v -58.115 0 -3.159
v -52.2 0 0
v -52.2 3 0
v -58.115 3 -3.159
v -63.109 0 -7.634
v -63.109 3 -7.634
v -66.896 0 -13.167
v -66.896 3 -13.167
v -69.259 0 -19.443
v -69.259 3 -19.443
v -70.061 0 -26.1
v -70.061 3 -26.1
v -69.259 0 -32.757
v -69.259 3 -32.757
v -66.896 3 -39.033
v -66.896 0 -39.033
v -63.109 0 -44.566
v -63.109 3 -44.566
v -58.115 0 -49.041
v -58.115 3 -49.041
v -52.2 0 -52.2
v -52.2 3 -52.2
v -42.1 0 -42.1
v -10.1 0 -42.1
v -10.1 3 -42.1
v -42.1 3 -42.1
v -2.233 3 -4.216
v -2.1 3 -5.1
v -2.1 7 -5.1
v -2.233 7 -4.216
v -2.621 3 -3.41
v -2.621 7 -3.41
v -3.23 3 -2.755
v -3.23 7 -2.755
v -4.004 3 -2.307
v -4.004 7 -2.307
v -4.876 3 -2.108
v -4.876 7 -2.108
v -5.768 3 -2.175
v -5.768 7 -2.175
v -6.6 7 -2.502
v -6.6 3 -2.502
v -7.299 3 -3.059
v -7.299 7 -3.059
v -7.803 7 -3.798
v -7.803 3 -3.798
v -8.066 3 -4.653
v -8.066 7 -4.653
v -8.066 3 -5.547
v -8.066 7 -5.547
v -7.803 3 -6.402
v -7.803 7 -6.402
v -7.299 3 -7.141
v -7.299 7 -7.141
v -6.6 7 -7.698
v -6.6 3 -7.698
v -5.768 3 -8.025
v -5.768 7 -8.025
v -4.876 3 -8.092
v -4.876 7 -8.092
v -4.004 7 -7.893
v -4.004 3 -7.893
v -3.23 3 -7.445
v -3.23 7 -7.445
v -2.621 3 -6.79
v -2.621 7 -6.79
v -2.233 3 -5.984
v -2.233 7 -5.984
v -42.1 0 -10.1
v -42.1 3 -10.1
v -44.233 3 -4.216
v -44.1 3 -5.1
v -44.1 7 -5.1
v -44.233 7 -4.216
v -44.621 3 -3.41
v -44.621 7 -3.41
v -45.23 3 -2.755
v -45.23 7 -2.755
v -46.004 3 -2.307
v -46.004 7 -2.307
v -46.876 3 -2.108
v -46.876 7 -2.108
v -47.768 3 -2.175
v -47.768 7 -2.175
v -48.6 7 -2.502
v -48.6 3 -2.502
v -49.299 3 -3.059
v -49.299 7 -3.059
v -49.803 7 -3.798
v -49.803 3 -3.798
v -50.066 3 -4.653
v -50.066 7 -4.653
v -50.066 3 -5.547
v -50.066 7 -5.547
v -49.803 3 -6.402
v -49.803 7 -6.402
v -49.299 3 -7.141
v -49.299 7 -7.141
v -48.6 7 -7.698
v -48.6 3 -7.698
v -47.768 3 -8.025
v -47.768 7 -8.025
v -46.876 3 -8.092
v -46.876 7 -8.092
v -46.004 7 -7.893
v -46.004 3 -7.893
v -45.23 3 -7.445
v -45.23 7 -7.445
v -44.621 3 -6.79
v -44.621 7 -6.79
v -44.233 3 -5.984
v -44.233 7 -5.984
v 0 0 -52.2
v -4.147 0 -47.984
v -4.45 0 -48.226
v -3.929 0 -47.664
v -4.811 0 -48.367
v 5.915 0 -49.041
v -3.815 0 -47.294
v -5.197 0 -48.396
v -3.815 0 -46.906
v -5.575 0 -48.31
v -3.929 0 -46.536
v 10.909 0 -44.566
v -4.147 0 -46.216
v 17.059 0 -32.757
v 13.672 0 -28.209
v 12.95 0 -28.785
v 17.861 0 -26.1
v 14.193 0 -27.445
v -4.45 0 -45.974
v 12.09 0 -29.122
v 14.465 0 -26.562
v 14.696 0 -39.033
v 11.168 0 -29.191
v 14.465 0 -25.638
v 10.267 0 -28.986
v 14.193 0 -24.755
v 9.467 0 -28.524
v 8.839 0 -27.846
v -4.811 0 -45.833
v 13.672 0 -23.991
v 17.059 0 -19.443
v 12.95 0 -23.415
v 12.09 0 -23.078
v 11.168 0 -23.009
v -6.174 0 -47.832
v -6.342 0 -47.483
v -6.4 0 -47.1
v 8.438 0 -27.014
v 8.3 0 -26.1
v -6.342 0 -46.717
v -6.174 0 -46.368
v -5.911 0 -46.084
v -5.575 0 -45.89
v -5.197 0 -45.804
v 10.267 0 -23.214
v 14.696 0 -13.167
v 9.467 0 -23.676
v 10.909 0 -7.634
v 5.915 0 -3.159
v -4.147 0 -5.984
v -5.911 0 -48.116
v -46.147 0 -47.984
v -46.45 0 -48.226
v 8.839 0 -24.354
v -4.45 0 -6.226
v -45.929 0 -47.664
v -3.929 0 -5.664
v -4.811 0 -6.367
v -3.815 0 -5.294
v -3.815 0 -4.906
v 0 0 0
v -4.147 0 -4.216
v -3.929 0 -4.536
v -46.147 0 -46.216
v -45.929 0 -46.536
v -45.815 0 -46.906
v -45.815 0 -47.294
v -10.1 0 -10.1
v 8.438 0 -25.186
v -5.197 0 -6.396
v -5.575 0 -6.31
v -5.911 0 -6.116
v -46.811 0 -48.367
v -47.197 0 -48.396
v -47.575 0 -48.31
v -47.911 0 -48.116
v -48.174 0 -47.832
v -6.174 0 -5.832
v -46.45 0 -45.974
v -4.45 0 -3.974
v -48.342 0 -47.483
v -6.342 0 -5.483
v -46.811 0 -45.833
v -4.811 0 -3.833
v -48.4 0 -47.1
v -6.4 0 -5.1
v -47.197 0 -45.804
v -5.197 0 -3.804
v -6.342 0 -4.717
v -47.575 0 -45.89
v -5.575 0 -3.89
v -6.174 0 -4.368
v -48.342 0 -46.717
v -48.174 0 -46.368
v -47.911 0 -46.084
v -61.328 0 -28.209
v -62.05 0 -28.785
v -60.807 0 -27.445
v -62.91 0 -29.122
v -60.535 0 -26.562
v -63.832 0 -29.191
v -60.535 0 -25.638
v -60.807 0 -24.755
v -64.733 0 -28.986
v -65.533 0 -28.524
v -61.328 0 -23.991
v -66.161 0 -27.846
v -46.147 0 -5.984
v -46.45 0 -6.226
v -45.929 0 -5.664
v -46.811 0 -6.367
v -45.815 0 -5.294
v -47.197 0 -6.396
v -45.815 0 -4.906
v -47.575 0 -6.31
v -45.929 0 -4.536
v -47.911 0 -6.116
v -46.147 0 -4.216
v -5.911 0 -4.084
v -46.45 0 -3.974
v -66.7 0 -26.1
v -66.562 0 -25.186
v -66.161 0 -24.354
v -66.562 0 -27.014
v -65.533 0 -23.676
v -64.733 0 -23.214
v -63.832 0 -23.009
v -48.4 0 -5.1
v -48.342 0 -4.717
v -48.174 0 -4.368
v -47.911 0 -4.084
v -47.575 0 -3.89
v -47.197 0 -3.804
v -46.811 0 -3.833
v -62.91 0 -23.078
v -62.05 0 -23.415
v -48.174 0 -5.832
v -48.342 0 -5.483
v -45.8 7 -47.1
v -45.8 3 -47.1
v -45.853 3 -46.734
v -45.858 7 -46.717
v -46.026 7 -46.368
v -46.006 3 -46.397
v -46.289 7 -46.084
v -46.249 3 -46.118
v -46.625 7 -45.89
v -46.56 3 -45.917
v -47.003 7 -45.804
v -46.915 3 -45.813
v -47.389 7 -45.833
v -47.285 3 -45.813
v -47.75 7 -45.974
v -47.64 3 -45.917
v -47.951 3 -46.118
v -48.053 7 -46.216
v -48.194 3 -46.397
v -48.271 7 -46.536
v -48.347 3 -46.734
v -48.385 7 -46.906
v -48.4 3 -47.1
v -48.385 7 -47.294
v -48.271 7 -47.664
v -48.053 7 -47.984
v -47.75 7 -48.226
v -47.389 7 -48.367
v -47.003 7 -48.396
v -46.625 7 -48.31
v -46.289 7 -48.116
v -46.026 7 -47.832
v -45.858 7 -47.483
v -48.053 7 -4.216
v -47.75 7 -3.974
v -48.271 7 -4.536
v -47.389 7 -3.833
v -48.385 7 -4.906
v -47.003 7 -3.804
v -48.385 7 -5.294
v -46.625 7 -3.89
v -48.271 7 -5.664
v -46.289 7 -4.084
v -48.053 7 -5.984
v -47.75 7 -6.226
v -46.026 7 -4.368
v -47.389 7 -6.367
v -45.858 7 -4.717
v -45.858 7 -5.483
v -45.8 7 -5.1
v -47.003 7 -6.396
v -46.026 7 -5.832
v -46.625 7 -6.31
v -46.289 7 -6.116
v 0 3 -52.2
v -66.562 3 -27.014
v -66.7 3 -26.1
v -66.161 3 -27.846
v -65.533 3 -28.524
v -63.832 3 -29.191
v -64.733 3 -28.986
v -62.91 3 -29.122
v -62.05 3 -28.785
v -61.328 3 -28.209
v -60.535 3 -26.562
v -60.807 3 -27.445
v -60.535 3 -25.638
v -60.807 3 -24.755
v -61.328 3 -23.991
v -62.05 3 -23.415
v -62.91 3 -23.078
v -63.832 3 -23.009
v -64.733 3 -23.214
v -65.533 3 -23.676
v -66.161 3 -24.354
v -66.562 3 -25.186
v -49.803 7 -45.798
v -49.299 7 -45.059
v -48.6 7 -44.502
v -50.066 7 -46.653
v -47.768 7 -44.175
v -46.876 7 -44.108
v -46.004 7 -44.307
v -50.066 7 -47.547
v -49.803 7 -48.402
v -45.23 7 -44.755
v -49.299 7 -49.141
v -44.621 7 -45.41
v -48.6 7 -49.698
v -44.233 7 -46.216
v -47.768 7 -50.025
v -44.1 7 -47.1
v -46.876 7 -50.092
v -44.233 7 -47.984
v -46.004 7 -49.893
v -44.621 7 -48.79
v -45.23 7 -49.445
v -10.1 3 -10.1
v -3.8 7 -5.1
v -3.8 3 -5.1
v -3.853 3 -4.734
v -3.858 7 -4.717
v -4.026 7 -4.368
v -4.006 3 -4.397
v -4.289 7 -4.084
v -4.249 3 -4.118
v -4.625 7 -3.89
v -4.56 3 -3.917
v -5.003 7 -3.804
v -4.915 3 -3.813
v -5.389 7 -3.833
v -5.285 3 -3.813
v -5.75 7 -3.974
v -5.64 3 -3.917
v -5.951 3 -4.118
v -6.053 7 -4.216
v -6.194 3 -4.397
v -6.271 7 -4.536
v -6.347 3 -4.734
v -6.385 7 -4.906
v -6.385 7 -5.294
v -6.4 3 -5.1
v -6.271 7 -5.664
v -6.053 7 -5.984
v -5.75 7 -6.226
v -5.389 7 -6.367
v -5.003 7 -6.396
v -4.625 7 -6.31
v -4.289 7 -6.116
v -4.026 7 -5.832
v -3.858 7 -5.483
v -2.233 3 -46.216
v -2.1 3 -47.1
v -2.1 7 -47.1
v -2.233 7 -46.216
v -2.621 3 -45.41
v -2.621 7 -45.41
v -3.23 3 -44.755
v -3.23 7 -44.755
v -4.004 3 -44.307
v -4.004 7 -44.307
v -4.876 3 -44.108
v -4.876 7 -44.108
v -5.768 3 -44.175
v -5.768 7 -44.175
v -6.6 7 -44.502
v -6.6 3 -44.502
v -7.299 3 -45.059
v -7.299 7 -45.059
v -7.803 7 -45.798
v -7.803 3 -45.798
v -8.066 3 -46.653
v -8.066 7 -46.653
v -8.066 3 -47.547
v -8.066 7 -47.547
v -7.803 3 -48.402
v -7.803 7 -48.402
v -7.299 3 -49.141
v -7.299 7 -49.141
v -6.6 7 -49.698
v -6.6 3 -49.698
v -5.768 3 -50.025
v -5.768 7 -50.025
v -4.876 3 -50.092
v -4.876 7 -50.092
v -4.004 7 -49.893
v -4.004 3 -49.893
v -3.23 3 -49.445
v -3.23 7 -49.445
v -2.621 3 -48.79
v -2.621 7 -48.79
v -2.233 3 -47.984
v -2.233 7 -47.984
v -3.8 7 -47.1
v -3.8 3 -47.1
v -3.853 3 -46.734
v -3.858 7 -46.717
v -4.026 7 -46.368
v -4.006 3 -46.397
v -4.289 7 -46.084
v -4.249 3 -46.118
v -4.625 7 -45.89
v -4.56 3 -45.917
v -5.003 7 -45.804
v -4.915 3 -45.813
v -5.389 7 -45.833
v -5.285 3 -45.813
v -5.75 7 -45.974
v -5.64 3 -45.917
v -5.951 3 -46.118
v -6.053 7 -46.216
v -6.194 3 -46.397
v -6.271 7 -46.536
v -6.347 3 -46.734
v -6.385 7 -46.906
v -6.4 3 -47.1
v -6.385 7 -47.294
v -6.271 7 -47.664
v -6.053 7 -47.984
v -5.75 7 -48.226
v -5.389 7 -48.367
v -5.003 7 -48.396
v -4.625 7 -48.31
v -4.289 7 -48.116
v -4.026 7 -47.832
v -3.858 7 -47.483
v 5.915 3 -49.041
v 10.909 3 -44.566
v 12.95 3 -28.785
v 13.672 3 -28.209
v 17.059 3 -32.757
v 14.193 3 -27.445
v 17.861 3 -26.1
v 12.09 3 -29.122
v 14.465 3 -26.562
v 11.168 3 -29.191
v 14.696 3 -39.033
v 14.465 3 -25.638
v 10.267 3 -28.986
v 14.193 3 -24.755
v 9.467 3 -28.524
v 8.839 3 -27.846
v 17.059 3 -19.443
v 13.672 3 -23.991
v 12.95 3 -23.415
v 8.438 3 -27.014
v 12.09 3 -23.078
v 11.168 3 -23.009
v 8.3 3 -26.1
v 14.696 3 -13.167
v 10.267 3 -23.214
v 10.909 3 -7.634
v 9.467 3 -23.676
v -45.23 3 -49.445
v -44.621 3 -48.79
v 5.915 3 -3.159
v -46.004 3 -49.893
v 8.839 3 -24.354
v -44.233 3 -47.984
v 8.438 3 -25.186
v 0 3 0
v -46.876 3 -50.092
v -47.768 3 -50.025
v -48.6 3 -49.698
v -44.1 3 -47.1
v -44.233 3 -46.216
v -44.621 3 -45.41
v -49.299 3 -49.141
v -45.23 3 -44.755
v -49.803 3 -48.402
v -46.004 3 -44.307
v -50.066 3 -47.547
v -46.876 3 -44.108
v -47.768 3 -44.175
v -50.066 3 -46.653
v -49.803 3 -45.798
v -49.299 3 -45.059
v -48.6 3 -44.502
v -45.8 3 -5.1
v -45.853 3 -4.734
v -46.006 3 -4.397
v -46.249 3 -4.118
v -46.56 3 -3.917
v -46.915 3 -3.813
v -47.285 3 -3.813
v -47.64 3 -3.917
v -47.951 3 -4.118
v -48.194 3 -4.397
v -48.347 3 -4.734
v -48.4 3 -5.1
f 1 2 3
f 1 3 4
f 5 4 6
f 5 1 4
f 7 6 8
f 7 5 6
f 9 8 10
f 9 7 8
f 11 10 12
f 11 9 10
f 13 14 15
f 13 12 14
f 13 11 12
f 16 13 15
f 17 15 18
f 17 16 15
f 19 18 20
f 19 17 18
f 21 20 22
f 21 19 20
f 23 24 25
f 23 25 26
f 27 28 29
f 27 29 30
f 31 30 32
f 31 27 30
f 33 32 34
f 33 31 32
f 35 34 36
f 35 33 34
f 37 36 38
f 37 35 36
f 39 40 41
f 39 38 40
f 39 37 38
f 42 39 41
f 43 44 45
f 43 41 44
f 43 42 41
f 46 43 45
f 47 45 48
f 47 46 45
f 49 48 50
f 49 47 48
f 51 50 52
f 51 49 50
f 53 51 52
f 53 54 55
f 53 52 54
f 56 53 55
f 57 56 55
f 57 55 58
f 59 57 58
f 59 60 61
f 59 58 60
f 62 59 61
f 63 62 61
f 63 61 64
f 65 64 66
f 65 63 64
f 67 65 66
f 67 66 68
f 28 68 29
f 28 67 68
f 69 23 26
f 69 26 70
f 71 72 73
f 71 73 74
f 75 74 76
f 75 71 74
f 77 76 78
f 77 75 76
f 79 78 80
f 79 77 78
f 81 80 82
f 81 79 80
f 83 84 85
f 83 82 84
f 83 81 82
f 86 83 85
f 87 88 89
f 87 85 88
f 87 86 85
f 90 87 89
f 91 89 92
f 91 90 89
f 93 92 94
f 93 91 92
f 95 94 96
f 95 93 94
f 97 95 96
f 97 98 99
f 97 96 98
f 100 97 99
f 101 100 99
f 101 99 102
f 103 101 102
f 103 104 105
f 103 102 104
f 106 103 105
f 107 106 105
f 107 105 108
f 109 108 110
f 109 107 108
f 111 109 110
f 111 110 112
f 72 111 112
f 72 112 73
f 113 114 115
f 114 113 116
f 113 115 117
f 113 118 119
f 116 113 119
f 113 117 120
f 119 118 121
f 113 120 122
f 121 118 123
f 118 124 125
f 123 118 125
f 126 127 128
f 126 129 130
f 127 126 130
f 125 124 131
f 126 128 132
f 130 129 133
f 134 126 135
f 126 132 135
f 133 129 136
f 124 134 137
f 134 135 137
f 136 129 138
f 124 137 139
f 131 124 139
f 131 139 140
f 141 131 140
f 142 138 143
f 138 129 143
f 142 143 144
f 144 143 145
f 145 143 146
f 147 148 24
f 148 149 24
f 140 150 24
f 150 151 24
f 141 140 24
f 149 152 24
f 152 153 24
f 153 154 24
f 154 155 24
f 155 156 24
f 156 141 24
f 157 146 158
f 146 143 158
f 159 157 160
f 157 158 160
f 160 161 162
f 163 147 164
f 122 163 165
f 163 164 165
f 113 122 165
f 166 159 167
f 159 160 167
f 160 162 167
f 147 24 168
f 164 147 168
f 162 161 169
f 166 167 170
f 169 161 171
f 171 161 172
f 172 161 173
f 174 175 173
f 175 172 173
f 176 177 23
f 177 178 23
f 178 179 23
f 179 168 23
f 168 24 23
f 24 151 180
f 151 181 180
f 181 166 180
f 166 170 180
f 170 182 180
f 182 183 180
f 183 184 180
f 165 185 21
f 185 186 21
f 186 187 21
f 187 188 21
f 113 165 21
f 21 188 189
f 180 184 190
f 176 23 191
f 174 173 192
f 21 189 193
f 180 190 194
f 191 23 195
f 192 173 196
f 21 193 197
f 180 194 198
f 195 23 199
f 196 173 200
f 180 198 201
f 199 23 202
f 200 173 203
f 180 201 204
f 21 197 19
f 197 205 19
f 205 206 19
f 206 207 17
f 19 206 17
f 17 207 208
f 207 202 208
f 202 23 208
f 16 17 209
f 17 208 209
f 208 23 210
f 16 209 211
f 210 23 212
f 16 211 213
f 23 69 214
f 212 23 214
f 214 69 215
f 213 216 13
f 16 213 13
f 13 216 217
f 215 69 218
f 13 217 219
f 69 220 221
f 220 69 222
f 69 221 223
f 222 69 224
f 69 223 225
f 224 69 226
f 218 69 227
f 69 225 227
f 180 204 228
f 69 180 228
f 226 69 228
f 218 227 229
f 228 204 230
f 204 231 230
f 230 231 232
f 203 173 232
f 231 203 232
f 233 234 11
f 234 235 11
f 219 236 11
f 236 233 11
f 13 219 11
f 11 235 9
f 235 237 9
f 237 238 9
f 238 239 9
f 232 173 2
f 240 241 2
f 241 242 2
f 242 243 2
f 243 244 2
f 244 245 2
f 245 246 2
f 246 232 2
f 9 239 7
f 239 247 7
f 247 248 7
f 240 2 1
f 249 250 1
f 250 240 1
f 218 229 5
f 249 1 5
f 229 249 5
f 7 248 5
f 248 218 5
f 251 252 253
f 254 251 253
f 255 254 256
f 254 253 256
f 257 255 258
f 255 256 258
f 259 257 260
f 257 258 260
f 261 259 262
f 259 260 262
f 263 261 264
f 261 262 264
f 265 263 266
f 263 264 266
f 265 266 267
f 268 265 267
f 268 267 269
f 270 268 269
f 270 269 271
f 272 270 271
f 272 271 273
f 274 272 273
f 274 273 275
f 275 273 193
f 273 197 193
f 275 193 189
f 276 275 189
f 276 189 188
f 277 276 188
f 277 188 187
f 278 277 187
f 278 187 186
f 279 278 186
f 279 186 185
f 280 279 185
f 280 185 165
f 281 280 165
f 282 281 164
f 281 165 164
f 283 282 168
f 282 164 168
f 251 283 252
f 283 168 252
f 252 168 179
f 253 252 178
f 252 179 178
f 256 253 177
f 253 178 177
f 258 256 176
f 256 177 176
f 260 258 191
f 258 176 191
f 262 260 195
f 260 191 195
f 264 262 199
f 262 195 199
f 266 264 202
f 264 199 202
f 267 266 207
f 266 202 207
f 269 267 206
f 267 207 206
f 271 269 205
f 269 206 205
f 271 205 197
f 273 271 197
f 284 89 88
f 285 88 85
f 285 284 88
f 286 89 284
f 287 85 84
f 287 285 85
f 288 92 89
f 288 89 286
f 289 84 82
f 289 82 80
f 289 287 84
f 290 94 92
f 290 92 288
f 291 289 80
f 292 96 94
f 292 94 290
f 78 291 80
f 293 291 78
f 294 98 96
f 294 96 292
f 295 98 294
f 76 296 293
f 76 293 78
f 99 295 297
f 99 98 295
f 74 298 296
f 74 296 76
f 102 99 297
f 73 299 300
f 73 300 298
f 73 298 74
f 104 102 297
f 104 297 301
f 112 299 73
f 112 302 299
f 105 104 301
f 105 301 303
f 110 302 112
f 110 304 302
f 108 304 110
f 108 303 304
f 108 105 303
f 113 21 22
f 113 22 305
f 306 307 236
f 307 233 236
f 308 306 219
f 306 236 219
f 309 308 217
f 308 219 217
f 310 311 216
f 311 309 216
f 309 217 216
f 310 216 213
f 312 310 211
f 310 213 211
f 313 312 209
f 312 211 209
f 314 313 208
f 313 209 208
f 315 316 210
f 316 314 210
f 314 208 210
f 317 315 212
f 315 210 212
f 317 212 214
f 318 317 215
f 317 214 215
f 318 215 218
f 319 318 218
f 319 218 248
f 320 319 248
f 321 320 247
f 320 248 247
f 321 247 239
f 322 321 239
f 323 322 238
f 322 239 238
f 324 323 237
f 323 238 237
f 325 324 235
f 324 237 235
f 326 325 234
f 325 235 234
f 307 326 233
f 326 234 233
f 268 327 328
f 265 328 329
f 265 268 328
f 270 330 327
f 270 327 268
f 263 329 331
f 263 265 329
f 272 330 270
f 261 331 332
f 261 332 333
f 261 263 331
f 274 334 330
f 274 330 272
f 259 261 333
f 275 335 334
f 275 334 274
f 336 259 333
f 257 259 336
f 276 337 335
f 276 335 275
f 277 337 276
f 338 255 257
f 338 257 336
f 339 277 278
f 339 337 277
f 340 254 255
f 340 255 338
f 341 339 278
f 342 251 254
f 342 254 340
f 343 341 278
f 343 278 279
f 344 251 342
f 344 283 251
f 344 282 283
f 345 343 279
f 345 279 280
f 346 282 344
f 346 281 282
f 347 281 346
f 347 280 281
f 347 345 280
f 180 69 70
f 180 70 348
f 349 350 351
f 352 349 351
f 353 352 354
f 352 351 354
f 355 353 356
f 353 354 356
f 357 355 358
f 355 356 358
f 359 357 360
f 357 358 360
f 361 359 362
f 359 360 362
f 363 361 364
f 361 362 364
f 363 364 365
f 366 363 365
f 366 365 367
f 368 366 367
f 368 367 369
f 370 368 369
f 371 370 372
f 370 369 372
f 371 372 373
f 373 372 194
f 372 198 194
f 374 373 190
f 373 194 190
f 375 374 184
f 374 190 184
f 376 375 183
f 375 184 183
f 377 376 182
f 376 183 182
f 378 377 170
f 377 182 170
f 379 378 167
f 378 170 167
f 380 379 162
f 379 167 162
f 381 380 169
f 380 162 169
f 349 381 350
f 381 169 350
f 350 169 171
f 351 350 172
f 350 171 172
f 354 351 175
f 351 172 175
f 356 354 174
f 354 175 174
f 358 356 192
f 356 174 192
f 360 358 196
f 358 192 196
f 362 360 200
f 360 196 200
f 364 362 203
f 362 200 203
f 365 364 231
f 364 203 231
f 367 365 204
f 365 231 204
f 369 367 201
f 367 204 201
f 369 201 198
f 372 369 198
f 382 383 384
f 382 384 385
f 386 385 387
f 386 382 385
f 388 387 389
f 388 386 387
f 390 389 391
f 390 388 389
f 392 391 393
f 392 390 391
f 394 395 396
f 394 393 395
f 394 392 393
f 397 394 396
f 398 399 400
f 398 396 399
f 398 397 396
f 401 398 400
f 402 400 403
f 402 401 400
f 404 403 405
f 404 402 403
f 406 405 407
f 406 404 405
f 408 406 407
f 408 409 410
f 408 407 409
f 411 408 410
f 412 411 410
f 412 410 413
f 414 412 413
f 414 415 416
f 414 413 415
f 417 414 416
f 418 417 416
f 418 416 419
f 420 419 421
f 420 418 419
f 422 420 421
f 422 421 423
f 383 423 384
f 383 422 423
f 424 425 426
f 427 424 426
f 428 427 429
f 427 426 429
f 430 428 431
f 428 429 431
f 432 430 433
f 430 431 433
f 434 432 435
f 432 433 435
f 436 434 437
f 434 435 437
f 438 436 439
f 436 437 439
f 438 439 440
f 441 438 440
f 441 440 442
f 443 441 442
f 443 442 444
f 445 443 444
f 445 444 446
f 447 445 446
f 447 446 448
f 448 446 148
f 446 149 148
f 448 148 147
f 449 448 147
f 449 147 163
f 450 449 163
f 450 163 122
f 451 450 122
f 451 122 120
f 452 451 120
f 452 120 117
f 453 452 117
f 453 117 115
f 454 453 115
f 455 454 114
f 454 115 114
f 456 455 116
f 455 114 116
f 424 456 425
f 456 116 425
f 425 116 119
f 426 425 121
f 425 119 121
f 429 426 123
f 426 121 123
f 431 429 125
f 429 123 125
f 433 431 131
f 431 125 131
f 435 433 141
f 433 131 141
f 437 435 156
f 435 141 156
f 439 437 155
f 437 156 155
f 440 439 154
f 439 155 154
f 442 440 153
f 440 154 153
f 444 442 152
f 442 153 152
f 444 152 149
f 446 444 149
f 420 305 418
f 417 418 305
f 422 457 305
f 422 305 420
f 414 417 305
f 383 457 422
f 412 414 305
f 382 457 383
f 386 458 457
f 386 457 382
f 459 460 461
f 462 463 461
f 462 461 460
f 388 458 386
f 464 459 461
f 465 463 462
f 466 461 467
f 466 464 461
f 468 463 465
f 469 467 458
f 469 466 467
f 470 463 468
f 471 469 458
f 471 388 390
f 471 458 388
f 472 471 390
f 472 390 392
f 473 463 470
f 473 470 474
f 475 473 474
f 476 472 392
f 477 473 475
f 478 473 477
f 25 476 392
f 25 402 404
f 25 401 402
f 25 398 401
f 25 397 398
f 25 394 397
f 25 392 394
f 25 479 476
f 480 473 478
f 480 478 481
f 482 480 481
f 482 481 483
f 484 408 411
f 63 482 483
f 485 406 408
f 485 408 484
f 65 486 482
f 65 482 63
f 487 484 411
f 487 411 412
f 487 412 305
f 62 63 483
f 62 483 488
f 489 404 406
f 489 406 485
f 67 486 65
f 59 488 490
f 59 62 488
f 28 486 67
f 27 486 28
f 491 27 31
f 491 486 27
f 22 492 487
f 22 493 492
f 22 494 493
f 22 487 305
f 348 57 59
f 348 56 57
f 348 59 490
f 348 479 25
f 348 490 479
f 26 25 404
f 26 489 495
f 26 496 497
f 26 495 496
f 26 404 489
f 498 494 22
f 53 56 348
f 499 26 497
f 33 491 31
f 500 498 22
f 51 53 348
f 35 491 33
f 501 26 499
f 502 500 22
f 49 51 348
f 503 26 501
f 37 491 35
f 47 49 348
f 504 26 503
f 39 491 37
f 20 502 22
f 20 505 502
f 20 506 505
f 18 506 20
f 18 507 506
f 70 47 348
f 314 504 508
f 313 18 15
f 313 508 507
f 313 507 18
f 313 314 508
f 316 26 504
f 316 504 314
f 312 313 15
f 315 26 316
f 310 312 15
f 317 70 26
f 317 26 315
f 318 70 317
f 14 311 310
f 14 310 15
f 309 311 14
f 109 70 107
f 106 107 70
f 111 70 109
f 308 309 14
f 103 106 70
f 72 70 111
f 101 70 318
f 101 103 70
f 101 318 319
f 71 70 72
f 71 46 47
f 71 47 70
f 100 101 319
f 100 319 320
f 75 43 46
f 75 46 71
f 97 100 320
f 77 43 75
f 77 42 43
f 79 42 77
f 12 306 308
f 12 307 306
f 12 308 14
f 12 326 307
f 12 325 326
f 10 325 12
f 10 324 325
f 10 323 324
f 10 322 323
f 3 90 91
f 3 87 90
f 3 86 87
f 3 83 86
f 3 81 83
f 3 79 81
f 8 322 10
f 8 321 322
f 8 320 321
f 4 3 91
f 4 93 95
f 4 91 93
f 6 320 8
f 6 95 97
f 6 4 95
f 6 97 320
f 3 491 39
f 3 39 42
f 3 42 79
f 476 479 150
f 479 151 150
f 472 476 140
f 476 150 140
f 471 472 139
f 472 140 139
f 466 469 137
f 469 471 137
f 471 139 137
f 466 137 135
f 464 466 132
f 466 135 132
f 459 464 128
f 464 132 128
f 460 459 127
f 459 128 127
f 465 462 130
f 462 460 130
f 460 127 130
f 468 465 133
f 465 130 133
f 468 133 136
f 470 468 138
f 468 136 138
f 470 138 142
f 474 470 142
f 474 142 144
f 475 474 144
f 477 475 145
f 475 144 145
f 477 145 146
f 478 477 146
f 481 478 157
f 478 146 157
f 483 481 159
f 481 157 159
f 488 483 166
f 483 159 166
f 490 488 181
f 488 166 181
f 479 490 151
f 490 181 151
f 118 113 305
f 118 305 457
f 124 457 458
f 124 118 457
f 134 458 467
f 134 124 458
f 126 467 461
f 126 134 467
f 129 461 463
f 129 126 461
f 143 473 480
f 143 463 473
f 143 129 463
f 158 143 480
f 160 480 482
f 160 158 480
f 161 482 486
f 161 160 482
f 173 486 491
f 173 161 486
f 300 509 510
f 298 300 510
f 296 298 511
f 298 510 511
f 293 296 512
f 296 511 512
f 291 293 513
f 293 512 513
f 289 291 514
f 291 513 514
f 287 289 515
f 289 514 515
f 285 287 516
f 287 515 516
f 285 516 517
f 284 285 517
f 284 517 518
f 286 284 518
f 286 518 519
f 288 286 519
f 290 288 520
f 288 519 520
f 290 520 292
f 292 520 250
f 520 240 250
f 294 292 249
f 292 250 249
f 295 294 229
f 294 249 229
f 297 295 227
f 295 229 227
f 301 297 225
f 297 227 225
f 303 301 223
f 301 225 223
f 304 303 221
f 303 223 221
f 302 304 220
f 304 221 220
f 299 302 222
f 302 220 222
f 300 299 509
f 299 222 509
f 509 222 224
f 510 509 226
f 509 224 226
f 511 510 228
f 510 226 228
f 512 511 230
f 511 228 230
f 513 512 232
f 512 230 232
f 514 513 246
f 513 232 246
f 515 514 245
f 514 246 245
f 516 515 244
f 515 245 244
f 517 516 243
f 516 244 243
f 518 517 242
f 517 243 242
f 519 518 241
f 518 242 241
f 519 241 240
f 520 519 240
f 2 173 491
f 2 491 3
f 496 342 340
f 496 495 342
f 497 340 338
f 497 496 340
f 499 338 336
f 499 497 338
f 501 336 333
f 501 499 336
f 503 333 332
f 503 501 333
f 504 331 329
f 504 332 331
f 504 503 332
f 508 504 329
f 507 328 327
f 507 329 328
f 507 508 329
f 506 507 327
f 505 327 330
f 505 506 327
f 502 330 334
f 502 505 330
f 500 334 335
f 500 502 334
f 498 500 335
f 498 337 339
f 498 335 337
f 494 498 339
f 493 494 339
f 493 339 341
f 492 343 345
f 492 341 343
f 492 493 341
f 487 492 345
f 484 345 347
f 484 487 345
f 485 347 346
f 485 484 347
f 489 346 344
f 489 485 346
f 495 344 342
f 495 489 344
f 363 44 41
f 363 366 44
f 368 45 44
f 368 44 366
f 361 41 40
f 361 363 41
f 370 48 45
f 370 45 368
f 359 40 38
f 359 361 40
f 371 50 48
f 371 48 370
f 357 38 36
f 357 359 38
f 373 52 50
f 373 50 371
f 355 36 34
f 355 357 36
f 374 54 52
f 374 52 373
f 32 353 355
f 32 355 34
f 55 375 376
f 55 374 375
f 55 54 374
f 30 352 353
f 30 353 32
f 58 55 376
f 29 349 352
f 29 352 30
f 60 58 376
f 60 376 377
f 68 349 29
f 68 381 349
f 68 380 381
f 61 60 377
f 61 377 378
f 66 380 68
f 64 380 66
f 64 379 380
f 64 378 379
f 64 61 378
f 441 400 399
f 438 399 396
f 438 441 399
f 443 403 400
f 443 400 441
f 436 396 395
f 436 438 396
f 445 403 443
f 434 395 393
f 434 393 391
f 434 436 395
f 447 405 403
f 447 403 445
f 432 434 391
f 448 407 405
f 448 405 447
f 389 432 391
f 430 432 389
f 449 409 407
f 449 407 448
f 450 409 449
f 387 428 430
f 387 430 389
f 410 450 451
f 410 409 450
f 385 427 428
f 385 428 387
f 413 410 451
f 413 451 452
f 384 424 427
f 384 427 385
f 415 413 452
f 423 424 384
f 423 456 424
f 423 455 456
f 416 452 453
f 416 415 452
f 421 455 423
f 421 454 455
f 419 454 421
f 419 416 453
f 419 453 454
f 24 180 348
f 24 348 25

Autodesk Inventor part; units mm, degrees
ref_plane "YZ Plane" through (0, 0, 0) normal (1, 0, 0) x (0, 1, 0)
ref_plane "XZ Plane" through (0, 0, 0) normal (0, 1, 0) x (-1, 0, 0)
ref_plane "XY Plane" through (0, 0, 0) normal (0, 0, 1) x (1, 0, 0)
sketch "Sketch1" plane through (0, 0, 0) normal (0, 1, 0) x (-1, 0, 0)
  line L0 (0, 0) -> (52.2, 0)
  line L1 (52.2, 0) -> (52.2, -52.2)
  line L2 (52.2, -52.2) -> (0, -52.2)
  line L3 (0, -52.2) -> (0, 0)
  circle A0 centre (47.1, -47.1) radius 1.3
  circle A1 centre (5.1, -5.1) radius 1.3
  circle A2 centre (5.1, -47.1) radius 1.3
  line L4 (0, 0) -> (52.2, -52.2) construction
  line L5 (52.2, 0) -> (0, -52.2) construction
  line L6 (5.1, -5.1) -> (47.1, -47.1) construction
  circle A3 centre (47.1, -5.1) radius 1.3
  circle A4 centre (63.6, -26.1) radius 3.1
  circle A5 centre (-11.4, -26.1) radius 3.1
  arc A6 (52.2, -52.2) -> (52.2, 0) centre (42.0615, -26.1) ccw
  arc A7 (0, 0) -> (0, -52.2) centre (10.1385, -26.1) ccw
  line L7 (10.1, -10.1) -> (10.1, -42.1)
  line L8 (10.1, -42.1) -> (42.1, -42.1)
  line L9 (42.1, -42.1) -> (42.1, -10.1)
  line L10 (42.1, -10.1) -> (10.1, -10.1)
  line L11 (10.1, -10.1) -> (42.1, -42.1) construction
  line L12 (10.1, -42.1) -> (42.1, -10.1) construction
  point P0 (26.1, -26.1)
  point P1 (26.1, -26.1)
  dimension "d1" = 42
  dimension "d2" = 42
  dimension "d3" = 2.6
  dimension "d4" = 2.6
  dimension "d5" = 2.6
  dimension "d18" = 52.2
  dimension "d19" = 52.2
  dimension "d24" = 2.6
  dimension "d26" = 6.2
  dimension "d27" = 6.2
  dimension "d28" = 75
  dimension "d29" = 37.5
  dimension "d30" = 28
  dimension "d31" = 28
  dimension "d32" = 32
  dimension "d33" = 32
extrude "Extrusion1" add sketch "Sketch1" along normal blind 3
sketch "Sketch2" plane through (0, 3, 0) normal (0, 1, 0) x (1, 0, 0)
  circle A0 centre (-5.1, 5.1) radius 1.3 projected
  circle A1 centre (-5.1, 5.1) radius 3
  circle A2 centre (-5.1, 47.1) radius 1.3 projected
  circle A3 centre (-5.1, 47.1) radius 3
  circle A4 centre (-47.1, 47.1) radius 1.3 projected
  circle A5 centre (-47.1, 47.1) radius 3
  circle A6 centre (-47.1, 5.1) radius 1.3 projected
  circle A7 centre (-47.1, 5.1) radius 3
  point P0 (0, 0)
  dimension "d12" = 6
  dimension "d13" = 6
  dimension "d14" = 6
  dimension "d25" = 6
extrude "Extrusion2" add sketch "Sketch2" along normal blind 4
equation "\"d4\" = d3"
equation "\"d5\" = d3"
equation "\"d19\" = d18"
equation "\"d24\" = d3"
equation "\"d27\" = d26"
equation "\"d29\" = 0.5 * d28"
equation "\"d33\" = d32"
equation "\"d13\" = d12"
equation "\"d14\" = d12"
equation "\"d25\" = d12"
equation "\"d7\" = d8"
equation "\"d8\" = 3"
properties part number "ephys_board_rack"
